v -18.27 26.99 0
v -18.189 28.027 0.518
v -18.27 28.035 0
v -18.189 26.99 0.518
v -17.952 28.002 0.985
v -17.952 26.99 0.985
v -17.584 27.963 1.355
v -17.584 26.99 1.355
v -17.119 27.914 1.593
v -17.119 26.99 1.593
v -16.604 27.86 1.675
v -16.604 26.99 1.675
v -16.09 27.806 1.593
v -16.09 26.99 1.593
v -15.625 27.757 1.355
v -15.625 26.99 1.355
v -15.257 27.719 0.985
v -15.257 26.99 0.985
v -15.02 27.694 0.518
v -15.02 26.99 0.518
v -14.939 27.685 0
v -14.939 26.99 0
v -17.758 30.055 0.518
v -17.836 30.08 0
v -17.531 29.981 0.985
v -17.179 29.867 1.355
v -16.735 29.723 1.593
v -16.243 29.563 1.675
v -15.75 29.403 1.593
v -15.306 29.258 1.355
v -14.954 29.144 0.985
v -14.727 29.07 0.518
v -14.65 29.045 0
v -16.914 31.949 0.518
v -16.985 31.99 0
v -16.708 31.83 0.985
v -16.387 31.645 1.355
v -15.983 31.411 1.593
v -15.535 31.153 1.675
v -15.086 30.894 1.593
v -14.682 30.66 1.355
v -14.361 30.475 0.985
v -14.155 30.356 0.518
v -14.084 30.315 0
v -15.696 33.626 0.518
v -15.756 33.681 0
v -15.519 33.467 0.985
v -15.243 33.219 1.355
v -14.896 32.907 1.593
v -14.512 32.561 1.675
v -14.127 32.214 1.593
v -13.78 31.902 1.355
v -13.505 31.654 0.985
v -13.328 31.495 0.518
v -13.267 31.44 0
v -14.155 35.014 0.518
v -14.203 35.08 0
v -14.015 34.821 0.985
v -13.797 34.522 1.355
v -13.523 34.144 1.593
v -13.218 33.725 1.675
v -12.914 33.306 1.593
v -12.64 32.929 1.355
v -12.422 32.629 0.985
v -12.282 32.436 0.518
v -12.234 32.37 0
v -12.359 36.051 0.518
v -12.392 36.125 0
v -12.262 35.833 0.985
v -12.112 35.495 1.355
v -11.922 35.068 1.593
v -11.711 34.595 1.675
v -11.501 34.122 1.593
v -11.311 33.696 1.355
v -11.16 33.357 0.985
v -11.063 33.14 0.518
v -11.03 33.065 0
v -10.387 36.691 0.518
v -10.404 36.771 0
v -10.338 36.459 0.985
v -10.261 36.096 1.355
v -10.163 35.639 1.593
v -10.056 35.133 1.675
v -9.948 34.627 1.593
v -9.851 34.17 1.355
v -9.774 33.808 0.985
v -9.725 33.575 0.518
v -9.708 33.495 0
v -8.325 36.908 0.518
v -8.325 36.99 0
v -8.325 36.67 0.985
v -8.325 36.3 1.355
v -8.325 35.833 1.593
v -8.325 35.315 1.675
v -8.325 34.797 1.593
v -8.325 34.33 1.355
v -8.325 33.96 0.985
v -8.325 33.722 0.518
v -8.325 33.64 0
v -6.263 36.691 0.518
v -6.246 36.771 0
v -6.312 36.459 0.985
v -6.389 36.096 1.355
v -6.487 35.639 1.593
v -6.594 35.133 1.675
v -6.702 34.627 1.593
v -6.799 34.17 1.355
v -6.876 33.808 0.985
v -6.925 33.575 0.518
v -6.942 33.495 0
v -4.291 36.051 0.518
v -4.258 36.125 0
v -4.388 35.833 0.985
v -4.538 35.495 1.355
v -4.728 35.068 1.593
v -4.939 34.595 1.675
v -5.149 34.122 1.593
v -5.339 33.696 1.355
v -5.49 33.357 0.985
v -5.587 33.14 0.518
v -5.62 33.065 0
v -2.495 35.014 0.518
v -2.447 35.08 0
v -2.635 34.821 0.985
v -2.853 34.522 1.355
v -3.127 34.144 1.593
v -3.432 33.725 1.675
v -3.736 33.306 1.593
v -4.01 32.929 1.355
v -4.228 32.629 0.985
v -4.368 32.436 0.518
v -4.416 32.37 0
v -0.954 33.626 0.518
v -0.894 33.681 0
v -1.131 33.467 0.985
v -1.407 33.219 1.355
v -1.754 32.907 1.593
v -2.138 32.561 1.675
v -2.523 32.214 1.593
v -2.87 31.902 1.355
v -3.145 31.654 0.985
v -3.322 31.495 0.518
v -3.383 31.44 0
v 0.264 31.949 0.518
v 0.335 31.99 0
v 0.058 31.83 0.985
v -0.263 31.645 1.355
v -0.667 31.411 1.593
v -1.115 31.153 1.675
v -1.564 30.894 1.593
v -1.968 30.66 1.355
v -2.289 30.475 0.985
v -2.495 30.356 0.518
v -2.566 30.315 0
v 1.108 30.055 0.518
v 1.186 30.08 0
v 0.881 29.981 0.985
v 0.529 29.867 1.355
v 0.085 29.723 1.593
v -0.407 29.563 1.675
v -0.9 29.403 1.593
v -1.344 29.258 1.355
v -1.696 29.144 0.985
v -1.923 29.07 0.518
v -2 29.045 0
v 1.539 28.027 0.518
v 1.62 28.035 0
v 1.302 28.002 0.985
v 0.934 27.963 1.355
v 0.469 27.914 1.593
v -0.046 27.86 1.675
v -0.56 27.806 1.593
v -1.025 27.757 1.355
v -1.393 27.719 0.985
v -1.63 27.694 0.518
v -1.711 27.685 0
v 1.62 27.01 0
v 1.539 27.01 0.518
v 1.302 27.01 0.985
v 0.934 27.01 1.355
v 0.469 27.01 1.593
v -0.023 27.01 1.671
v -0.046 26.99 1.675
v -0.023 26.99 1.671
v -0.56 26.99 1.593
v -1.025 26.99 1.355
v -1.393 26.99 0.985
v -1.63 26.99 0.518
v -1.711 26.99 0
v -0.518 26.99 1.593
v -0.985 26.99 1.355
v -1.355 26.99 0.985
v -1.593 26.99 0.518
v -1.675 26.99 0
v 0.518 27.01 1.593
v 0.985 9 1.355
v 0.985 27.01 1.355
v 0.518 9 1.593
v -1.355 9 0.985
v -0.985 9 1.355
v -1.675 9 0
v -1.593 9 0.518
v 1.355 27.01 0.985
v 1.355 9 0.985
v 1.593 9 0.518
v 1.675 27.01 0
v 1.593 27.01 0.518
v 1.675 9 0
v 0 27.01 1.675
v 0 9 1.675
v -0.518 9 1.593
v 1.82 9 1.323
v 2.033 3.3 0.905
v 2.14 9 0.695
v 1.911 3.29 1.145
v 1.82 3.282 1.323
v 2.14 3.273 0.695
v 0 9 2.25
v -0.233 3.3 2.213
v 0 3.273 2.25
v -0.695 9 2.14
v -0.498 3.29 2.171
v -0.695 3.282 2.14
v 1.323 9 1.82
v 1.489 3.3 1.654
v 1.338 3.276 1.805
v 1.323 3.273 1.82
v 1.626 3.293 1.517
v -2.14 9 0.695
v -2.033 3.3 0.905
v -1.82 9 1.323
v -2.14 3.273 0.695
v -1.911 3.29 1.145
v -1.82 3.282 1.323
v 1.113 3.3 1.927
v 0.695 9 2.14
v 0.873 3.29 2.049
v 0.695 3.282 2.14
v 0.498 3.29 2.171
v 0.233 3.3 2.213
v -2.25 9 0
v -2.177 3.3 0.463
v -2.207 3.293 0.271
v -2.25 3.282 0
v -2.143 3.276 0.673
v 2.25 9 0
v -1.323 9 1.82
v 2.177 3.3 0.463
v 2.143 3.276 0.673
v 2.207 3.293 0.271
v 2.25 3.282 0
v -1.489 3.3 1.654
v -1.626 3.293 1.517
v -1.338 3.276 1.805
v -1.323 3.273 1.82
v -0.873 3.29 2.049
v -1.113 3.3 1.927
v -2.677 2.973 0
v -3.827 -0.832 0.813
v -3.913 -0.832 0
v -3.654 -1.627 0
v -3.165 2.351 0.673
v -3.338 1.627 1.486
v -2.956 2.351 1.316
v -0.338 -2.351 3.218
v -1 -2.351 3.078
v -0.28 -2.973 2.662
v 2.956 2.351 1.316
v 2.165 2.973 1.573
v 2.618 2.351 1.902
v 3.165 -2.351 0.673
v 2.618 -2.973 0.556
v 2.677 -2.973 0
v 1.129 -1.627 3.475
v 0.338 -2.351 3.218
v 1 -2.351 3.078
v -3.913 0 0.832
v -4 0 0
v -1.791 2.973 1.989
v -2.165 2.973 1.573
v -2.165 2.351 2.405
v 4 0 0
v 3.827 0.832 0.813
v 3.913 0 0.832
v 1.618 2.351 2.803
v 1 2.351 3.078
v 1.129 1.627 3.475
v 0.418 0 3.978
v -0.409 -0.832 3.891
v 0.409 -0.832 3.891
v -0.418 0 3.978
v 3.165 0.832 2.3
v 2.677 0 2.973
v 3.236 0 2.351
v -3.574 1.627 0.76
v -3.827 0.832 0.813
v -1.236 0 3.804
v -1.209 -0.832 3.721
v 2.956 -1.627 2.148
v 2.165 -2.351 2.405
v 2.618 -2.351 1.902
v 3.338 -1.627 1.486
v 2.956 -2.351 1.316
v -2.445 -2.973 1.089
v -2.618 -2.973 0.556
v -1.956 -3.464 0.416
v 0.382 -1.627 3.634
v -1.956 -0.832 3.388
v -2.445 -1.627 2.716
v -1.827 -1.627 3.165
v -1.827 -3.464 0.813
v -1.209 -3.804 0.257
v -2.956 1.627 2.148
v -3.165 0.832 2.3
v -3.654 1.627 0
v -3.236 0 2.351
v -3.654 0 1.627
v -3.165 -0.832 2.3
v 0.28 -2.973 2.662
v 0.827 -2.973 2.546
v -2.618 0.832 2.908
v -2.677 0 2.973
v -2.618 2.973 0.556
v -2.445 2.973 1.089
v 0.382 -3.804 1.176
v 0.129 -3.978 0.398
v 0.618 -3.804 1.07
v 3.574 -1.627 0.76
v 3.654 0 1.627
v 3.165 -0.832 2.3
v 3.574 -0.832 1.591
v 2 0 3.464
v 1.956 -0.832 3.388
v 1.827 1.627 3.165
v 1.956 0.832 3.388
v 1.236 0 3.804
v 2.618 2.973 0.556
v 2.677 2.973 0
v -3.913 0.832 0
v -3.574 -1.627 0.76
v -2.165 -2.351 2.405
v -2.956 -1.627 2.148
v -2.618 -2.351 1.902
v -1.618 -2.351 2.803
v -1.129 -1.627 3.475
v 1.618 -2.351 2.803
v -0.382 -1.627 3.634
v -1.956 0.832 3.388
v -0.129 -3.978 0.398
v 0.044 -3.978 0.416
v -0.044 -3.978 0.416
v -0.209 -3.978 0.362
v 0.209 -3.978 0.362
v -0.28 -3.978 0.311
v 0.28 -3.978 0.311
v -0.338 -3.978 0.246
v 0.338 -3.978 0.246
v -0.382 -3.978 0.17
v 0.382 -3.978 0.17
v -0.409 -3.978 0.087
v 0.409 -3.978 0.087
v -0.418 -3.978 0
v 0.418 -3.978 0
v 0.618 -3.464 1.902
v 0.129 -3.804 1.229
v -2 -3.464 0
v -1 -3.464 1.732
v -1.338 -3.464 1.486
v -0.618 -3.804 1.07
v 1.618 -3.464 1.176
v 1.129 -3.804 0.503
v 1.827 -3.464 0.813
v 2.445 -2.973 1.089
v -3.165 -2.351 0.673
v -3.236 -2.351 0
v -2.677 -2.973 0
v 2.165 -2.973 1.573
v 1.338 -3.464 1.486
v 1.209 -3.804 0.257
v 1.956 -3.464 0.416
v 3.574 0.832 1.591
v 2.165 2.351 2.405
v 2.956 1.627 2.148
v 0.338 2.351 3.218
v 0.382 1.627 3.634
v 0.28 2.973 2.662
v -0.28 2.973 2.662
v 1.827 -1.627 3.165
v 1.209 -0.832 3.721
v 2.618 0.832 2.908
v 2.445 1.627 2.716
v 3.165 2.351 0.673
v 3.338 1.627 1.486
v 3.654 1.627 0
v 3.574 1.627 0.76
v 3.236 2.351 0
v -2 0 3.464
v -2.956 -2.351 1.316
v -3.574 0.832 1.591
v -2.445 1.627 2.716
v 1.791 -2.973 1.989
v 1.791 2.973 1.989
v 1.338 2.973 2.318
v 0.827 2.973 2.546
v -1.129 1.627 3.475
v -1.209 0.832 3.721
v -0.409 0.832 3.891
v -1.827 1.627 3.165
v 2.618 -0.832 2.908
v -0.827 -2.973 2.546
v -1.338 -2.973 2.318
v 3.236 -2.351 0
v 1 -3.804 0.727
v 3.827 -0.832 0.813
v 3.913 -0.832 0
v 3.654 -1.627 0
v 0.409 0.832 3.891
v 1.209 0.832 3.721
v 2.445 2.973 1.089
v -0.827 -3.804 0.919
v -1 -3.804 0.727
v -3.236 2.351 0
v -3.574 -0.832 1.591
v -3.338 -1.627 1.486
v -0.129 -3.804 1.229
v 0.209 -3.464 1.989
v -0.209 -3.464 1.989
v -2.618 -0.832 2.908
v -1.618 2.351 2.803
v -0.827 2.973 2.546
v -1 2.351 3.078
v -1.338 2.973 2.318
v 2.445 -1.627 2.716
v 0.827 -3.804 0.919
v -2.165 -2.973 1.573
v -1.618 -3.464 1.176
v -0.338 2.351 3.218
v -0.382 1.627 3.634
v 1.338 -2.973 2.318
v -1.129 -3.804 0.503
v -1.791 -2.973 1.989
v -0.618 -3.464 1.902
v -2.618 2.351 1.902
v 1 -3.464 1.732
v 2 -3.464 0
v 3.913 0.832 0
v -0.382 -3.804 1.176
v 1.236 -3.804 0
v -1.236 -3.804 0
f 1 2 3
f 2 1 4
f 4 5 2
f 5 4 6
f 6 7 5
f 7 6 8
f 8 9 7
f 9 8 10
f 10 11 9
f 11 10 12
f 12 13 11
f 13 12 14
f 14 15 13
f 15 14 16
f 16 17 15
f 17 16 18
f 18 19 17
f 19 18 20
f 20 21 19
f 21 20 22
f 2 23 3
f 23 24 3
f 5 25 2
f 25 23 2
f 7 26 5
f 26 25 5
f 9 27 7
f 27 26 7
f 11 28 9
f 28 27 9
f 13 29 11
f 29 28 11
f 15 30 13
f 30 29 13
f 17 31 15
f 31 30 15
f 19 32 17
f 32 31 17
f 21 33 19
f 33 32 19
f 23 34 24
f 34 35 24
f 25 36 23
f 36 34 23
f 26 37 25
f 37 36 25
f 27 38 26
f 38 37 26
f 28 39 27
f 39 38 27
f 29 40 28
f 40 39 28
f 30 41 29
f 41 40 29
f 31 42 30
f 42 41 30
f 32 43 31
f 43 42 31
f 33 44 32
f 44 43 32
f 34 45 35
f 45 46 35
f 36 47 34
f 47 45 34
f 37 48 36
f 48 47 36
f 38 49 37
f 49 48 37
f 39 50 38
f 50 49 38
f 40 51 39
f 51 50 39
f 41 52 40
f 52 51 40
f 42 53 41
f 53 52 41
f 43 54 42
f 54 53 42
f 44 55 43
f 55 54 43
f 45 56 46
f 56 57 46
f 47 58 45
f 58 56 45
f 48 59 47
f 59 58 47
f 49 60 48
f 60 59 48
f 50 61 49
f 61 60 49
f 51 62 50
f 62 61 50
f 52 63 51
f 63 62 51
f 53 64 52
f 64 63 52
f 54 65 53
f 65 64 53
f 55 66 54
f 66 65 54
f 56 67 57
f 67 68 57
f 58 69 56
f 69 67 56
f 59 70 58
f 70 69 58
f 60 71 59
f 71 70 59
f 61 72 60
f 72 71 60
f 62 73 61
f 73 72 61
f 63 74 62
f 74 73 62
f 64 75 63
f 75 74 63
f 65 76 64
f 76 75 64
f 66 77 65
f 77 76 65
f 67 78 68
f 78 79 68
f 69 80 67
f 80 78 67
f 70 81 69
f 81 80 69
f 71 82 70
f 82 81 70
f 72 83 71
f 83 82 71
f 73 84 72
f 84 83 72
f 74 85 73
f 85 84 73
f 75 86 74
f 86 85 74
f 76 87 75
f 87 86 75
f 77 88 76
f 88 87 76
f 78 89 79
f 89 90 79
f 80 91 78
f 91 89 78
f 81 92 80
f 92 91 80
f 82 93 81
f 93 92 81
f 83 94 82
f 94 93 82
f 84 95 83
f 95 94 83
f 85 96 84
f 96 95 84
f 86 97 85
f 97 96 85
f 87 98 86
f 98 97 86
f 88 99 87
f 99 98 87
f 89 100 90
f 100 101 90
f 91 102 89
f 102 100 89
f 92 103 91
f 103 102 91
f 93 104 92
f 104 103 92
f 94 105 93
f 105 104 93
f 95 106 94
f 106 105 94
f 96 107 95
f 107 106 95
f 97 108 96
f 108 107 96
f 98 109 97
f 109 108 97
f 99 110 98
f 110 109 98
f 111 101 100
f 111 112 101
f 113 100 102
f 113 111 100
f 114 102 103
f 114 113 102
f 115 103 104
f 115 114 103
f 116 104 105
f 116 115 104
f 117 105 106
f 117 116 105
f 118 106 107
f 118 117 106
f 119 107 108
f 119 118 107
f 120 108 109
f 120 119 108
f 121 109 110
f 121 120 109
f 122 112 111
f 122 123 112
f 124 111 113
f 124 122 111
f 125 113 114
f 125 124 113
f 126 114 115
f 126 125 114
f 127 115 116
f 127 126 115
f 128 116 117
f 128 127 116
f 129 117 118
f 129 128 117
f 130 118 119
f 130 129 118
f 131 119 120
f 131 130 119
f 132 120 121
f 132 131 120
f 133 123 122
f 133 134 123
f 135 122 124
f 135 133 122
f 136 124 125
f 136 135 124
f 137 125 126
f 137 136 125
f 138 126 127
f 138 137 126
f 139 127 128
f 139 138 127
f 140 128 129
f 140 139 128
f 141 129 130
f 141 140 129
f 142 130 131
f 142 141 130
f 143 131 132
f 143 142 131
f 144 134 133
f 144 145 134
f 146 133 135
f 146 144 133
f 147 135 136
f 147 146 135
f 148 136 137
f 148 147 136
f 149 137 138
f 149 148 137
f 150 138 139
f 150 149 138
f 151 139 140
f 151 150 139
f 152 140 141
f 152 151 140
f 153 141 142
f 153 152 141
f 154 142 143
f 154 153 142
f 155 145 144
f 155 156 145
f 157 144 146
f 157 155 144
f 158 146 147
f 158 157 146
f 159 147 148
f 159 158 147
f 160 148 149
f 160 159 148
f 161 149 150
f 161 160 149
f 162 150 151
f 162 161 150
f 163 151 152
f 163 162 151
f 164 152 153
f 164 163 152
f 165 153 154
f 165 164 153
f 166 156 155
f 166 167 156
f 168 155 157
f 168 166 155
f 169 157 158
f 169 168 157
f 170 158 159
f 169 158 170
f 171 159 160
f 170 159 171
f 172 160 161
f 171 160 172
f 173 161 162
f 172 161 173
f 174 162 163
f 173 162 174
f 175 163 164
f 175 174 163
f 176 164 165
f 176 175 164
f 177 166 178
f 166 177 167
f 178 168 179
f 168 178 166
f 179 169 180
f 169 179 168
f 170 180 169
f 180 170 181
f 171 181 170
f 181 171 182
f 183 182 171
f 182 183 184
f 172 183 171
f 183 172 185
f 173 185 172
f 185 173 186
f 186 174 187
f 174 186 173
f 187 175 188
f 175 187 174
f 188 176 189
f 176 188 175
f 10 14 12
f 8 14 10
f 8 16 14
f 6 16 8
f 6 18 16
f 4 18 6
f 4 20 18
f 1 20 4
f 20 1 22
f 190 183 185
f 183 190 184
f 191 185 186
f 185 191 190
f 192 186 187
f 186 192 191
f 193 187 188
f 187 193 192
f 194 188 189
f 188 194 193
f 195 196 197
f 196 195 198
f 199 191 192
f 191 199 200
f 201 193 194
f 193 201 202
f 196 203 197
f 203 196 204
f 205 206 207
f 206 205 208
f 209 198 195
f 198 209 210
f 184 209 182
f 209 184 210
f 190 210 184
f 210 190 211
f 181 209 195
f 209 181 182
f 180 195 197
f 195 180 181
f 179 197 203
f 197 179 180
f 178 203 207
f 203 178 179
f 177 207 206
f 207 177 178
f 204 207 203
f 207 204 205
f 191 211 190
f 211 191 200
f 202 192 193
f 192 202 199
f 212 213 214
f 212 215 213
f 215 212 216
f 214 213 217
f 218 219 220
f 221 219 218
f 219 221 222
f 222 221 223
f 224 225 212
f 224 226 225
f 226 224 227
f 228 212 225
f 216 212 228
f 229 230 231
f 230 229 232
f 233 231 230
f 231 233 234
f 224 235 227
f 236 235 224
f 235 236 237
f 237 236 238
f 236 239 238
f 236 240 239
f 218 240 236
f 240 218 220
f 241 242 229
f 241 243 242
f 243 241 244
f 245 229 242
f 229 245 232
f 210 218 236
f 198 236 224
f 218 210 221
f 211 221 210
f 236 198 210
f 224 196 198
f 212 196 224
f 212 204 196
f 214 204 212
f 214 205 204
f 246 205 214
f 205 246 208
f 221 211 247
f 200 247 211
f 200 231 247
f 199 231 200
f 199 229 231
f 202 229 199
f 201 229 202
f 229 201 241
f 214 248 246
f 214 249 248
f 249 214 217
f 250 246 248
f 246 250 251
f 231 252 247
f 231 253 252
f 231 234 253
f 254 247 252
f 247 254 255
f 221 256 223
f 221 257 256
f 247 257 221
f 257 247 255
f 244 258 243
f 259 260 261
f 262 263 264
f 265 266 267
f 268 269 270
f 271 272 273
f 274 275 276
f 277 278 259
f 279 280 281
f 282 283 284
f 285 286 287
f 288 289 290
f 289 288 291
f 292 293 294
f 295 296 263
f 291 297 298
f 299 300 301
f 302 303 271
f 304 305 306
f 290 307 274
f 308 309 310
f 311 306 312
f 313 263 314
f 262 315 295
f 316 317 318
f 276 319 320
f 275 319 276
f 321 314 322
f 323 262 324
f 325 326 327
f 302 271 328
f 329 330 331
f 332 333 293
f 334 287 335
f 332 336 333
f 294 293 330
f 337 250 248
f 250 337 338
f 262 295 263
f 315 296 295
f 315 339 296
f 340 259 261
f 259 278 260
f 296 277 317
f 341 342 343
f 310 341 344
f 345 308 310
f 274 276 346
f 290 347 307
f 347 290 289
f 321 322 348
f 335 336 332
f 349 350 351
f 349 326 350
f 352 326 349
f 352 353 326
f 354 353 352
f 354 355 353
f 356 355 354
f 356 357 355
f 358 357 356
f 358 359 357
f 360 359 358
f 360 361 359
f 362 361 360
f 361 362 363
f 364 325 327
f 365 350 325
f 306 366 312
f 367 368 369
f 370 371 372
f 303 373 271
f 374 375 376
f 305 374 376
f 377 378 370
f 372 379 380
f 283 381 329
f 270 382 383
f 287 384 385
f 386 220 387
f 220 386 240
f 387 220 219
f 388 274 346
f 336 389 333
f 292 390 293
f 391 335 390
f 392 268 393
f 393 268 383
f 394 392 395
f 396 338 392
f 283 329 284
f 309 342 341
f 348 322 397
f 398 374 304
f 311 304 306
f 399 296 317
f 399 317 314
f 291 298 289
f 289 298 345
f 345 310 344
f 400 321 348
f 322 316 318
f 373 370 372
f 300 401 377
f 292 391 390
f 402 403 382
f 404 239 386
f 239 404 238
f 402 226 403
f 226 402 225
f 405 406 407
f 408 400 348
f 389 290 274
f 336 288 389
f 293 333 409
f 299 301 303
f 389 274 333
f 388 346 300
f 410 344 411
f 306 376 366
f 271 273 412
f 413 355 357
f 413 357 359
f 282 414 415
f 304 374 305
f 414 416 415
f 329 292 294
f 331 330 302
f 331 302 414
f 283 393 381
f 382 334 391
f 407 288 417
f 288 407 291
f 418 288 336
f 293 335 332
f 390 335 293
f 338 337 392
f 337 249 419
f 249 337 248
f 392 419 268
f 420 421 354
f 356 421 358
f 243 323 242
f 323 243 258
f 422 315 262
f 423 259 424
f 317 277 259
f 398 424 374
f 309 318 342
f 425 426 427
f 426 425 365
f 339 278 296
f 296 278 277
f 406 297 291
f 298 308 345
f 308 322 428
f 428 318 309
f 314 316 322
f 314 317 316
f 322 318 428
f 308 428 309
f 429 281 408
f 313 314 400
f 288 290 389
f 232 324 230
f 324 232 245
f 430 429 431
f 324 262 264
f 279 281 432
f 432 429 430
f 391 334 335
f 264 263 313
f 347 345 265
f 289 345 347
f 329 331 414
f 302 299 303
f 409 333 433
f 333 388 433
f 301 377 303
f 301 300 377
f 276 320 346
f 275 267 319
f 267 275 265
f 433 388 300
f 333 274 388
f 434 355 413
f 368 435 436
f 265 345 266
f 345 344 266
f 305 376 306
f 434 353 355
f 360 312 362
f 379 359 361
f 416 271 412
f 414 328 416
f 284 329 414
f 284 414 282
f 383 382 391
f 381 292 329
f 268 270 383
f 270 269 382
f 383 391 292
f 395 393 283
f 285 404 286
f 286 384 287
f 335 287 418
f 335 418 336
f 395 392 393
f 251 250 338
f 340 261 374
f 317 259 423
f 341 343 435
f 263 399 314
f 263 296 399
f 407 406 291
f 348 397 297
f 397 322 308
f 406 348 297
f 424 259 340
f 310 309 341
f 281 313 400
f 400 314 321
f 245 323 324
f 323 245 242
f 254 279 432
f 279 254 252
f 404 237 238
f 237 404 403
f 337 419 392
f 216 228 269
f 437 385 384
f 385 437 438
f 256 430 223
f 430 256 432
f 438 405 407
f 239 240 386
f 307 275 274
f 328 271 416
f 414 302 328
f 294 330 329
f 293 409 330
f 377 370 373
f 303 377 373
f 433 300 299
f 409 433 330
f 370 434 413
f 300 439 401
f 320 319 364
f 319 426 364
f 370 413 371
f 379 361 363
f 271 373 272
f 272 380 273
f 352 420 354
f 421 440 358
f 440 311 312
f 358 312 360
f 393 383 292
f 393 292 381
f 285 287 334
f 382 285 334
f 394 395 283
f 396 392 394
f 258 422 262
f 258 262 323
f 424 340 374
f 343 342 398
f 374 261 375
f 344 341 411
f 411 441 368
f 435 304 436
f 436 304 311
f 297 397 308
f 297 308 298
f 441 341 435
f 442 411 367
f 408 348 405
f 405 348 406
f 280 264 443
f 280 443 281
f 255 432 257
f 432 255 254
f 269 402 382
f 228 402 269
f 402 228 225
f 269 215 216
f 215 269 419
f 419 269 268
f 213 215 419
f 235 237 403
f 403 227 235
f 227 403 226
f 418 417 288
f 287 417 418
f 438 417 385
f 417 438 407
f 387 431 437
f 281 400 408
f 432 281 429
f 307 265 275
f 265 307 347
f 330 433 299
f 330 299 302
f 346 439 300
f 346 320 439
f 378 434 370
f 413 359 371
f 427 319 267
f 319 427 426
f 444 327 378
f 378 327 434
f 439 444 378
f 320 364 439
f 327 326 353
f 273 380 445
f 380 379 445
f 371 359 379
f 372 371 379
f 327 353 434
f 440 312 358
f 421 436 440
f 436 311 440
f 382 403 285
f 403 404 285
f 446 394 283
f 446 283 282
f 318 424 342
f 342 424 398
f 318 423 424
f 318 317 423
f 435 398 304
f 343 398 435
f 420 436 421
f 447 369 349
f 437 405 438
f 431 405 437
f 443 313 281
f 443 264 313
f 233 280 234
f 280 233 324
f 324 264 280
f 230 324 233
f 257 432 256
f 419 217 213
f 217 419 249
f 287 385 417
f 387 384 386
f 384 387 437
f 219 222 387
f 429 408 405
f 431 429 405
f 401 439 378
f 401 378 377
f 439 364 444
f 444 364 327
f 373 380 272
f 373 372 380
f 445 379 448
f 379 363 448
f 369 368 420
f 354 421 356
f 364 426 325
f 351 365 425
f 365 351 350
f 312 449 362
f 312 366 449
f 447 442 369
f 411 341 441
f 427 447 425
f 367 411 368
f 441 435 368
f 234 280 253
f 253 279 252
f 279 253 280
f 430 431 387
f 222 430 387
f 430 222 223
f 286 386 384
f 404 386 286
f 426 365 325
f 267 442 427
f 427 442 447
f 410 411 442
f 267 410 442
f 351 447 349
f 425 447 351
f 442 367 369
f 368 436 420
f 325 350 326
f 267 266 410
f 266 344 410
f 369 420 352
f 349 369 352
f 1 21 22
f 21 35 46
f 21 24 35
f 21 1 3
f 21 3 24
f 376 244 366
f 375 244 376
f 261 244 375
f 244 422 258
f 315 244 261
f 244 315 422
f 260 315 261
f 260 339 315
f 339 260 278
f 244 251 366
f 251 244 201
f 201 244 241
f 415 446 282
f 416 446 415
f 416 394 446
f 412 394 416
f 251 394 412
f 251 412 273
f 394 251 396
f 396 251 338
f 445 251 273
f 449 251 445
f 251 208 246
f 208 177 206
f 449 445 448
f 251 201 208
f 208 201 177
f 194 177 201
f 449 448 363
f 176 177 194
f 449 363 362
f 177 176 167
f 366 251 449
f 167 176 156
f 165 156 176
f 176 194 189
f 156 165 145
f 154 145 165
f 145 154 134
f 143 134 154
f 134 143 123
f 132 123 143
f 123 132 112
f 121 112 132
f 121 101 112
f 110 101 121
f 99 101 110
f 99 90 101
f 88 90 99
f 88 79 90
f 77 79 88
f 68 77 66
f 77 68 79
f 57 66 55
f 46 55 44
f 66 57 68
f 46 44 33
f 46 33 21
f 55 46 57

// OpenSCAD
// file: suction-cup-hook.scad
hook_diameter = 3.35;
plug_diameter = 4.5;
ball_diameter = 8;

plug_height = 5;
hook_height = 20;

curve_diameter = 20 - hook_diameter;

include <MCAD/units.scad>
use <MCAD/2Dshapes.scad>

module hook ()
{
    intersection () {
        rotate_extrude ()
        translate ([curve_diameter / 2, 0, 0])
        circle (d=hook_diameter, $fn=20);

        linear_extrude (h=curve_diameter + epsilon, center=true)
        pieSlice (size=curve_diameter + epsilon, start_angle=-90, end_angle=90);
    }
}

module suction_cup_hook () {
    rotate (90, X) {
        sphere (d=ball_diameter, $fn=30);

        translate ([0, 0, ball_diameter/4]) {
            cylinder (d=plug_diameter, h=plug_height + ball_diameter/4, $fn=20);

            translate ([0, 0, plug_height - epsilon]) {
                cylinder (d=hook_diameter, h=hook_height + epsilon * 2, $fn=20);

                translate ([-curve_diameter/2, 0, hook_height])
                rotate (-90, Y)
                rotate (90, X)
                hook ();
            }
        }
    }
}

suction_cup_hook ();
// main file
use <suction-cup-hook.scad>
include <MCAD/units.scad>

rotate (180, X)
intersection () {
    suction_cup_hook ();

    mirror (Z)
    linear_extrude (h=100)
    square ([400, 400], center=true);
}
